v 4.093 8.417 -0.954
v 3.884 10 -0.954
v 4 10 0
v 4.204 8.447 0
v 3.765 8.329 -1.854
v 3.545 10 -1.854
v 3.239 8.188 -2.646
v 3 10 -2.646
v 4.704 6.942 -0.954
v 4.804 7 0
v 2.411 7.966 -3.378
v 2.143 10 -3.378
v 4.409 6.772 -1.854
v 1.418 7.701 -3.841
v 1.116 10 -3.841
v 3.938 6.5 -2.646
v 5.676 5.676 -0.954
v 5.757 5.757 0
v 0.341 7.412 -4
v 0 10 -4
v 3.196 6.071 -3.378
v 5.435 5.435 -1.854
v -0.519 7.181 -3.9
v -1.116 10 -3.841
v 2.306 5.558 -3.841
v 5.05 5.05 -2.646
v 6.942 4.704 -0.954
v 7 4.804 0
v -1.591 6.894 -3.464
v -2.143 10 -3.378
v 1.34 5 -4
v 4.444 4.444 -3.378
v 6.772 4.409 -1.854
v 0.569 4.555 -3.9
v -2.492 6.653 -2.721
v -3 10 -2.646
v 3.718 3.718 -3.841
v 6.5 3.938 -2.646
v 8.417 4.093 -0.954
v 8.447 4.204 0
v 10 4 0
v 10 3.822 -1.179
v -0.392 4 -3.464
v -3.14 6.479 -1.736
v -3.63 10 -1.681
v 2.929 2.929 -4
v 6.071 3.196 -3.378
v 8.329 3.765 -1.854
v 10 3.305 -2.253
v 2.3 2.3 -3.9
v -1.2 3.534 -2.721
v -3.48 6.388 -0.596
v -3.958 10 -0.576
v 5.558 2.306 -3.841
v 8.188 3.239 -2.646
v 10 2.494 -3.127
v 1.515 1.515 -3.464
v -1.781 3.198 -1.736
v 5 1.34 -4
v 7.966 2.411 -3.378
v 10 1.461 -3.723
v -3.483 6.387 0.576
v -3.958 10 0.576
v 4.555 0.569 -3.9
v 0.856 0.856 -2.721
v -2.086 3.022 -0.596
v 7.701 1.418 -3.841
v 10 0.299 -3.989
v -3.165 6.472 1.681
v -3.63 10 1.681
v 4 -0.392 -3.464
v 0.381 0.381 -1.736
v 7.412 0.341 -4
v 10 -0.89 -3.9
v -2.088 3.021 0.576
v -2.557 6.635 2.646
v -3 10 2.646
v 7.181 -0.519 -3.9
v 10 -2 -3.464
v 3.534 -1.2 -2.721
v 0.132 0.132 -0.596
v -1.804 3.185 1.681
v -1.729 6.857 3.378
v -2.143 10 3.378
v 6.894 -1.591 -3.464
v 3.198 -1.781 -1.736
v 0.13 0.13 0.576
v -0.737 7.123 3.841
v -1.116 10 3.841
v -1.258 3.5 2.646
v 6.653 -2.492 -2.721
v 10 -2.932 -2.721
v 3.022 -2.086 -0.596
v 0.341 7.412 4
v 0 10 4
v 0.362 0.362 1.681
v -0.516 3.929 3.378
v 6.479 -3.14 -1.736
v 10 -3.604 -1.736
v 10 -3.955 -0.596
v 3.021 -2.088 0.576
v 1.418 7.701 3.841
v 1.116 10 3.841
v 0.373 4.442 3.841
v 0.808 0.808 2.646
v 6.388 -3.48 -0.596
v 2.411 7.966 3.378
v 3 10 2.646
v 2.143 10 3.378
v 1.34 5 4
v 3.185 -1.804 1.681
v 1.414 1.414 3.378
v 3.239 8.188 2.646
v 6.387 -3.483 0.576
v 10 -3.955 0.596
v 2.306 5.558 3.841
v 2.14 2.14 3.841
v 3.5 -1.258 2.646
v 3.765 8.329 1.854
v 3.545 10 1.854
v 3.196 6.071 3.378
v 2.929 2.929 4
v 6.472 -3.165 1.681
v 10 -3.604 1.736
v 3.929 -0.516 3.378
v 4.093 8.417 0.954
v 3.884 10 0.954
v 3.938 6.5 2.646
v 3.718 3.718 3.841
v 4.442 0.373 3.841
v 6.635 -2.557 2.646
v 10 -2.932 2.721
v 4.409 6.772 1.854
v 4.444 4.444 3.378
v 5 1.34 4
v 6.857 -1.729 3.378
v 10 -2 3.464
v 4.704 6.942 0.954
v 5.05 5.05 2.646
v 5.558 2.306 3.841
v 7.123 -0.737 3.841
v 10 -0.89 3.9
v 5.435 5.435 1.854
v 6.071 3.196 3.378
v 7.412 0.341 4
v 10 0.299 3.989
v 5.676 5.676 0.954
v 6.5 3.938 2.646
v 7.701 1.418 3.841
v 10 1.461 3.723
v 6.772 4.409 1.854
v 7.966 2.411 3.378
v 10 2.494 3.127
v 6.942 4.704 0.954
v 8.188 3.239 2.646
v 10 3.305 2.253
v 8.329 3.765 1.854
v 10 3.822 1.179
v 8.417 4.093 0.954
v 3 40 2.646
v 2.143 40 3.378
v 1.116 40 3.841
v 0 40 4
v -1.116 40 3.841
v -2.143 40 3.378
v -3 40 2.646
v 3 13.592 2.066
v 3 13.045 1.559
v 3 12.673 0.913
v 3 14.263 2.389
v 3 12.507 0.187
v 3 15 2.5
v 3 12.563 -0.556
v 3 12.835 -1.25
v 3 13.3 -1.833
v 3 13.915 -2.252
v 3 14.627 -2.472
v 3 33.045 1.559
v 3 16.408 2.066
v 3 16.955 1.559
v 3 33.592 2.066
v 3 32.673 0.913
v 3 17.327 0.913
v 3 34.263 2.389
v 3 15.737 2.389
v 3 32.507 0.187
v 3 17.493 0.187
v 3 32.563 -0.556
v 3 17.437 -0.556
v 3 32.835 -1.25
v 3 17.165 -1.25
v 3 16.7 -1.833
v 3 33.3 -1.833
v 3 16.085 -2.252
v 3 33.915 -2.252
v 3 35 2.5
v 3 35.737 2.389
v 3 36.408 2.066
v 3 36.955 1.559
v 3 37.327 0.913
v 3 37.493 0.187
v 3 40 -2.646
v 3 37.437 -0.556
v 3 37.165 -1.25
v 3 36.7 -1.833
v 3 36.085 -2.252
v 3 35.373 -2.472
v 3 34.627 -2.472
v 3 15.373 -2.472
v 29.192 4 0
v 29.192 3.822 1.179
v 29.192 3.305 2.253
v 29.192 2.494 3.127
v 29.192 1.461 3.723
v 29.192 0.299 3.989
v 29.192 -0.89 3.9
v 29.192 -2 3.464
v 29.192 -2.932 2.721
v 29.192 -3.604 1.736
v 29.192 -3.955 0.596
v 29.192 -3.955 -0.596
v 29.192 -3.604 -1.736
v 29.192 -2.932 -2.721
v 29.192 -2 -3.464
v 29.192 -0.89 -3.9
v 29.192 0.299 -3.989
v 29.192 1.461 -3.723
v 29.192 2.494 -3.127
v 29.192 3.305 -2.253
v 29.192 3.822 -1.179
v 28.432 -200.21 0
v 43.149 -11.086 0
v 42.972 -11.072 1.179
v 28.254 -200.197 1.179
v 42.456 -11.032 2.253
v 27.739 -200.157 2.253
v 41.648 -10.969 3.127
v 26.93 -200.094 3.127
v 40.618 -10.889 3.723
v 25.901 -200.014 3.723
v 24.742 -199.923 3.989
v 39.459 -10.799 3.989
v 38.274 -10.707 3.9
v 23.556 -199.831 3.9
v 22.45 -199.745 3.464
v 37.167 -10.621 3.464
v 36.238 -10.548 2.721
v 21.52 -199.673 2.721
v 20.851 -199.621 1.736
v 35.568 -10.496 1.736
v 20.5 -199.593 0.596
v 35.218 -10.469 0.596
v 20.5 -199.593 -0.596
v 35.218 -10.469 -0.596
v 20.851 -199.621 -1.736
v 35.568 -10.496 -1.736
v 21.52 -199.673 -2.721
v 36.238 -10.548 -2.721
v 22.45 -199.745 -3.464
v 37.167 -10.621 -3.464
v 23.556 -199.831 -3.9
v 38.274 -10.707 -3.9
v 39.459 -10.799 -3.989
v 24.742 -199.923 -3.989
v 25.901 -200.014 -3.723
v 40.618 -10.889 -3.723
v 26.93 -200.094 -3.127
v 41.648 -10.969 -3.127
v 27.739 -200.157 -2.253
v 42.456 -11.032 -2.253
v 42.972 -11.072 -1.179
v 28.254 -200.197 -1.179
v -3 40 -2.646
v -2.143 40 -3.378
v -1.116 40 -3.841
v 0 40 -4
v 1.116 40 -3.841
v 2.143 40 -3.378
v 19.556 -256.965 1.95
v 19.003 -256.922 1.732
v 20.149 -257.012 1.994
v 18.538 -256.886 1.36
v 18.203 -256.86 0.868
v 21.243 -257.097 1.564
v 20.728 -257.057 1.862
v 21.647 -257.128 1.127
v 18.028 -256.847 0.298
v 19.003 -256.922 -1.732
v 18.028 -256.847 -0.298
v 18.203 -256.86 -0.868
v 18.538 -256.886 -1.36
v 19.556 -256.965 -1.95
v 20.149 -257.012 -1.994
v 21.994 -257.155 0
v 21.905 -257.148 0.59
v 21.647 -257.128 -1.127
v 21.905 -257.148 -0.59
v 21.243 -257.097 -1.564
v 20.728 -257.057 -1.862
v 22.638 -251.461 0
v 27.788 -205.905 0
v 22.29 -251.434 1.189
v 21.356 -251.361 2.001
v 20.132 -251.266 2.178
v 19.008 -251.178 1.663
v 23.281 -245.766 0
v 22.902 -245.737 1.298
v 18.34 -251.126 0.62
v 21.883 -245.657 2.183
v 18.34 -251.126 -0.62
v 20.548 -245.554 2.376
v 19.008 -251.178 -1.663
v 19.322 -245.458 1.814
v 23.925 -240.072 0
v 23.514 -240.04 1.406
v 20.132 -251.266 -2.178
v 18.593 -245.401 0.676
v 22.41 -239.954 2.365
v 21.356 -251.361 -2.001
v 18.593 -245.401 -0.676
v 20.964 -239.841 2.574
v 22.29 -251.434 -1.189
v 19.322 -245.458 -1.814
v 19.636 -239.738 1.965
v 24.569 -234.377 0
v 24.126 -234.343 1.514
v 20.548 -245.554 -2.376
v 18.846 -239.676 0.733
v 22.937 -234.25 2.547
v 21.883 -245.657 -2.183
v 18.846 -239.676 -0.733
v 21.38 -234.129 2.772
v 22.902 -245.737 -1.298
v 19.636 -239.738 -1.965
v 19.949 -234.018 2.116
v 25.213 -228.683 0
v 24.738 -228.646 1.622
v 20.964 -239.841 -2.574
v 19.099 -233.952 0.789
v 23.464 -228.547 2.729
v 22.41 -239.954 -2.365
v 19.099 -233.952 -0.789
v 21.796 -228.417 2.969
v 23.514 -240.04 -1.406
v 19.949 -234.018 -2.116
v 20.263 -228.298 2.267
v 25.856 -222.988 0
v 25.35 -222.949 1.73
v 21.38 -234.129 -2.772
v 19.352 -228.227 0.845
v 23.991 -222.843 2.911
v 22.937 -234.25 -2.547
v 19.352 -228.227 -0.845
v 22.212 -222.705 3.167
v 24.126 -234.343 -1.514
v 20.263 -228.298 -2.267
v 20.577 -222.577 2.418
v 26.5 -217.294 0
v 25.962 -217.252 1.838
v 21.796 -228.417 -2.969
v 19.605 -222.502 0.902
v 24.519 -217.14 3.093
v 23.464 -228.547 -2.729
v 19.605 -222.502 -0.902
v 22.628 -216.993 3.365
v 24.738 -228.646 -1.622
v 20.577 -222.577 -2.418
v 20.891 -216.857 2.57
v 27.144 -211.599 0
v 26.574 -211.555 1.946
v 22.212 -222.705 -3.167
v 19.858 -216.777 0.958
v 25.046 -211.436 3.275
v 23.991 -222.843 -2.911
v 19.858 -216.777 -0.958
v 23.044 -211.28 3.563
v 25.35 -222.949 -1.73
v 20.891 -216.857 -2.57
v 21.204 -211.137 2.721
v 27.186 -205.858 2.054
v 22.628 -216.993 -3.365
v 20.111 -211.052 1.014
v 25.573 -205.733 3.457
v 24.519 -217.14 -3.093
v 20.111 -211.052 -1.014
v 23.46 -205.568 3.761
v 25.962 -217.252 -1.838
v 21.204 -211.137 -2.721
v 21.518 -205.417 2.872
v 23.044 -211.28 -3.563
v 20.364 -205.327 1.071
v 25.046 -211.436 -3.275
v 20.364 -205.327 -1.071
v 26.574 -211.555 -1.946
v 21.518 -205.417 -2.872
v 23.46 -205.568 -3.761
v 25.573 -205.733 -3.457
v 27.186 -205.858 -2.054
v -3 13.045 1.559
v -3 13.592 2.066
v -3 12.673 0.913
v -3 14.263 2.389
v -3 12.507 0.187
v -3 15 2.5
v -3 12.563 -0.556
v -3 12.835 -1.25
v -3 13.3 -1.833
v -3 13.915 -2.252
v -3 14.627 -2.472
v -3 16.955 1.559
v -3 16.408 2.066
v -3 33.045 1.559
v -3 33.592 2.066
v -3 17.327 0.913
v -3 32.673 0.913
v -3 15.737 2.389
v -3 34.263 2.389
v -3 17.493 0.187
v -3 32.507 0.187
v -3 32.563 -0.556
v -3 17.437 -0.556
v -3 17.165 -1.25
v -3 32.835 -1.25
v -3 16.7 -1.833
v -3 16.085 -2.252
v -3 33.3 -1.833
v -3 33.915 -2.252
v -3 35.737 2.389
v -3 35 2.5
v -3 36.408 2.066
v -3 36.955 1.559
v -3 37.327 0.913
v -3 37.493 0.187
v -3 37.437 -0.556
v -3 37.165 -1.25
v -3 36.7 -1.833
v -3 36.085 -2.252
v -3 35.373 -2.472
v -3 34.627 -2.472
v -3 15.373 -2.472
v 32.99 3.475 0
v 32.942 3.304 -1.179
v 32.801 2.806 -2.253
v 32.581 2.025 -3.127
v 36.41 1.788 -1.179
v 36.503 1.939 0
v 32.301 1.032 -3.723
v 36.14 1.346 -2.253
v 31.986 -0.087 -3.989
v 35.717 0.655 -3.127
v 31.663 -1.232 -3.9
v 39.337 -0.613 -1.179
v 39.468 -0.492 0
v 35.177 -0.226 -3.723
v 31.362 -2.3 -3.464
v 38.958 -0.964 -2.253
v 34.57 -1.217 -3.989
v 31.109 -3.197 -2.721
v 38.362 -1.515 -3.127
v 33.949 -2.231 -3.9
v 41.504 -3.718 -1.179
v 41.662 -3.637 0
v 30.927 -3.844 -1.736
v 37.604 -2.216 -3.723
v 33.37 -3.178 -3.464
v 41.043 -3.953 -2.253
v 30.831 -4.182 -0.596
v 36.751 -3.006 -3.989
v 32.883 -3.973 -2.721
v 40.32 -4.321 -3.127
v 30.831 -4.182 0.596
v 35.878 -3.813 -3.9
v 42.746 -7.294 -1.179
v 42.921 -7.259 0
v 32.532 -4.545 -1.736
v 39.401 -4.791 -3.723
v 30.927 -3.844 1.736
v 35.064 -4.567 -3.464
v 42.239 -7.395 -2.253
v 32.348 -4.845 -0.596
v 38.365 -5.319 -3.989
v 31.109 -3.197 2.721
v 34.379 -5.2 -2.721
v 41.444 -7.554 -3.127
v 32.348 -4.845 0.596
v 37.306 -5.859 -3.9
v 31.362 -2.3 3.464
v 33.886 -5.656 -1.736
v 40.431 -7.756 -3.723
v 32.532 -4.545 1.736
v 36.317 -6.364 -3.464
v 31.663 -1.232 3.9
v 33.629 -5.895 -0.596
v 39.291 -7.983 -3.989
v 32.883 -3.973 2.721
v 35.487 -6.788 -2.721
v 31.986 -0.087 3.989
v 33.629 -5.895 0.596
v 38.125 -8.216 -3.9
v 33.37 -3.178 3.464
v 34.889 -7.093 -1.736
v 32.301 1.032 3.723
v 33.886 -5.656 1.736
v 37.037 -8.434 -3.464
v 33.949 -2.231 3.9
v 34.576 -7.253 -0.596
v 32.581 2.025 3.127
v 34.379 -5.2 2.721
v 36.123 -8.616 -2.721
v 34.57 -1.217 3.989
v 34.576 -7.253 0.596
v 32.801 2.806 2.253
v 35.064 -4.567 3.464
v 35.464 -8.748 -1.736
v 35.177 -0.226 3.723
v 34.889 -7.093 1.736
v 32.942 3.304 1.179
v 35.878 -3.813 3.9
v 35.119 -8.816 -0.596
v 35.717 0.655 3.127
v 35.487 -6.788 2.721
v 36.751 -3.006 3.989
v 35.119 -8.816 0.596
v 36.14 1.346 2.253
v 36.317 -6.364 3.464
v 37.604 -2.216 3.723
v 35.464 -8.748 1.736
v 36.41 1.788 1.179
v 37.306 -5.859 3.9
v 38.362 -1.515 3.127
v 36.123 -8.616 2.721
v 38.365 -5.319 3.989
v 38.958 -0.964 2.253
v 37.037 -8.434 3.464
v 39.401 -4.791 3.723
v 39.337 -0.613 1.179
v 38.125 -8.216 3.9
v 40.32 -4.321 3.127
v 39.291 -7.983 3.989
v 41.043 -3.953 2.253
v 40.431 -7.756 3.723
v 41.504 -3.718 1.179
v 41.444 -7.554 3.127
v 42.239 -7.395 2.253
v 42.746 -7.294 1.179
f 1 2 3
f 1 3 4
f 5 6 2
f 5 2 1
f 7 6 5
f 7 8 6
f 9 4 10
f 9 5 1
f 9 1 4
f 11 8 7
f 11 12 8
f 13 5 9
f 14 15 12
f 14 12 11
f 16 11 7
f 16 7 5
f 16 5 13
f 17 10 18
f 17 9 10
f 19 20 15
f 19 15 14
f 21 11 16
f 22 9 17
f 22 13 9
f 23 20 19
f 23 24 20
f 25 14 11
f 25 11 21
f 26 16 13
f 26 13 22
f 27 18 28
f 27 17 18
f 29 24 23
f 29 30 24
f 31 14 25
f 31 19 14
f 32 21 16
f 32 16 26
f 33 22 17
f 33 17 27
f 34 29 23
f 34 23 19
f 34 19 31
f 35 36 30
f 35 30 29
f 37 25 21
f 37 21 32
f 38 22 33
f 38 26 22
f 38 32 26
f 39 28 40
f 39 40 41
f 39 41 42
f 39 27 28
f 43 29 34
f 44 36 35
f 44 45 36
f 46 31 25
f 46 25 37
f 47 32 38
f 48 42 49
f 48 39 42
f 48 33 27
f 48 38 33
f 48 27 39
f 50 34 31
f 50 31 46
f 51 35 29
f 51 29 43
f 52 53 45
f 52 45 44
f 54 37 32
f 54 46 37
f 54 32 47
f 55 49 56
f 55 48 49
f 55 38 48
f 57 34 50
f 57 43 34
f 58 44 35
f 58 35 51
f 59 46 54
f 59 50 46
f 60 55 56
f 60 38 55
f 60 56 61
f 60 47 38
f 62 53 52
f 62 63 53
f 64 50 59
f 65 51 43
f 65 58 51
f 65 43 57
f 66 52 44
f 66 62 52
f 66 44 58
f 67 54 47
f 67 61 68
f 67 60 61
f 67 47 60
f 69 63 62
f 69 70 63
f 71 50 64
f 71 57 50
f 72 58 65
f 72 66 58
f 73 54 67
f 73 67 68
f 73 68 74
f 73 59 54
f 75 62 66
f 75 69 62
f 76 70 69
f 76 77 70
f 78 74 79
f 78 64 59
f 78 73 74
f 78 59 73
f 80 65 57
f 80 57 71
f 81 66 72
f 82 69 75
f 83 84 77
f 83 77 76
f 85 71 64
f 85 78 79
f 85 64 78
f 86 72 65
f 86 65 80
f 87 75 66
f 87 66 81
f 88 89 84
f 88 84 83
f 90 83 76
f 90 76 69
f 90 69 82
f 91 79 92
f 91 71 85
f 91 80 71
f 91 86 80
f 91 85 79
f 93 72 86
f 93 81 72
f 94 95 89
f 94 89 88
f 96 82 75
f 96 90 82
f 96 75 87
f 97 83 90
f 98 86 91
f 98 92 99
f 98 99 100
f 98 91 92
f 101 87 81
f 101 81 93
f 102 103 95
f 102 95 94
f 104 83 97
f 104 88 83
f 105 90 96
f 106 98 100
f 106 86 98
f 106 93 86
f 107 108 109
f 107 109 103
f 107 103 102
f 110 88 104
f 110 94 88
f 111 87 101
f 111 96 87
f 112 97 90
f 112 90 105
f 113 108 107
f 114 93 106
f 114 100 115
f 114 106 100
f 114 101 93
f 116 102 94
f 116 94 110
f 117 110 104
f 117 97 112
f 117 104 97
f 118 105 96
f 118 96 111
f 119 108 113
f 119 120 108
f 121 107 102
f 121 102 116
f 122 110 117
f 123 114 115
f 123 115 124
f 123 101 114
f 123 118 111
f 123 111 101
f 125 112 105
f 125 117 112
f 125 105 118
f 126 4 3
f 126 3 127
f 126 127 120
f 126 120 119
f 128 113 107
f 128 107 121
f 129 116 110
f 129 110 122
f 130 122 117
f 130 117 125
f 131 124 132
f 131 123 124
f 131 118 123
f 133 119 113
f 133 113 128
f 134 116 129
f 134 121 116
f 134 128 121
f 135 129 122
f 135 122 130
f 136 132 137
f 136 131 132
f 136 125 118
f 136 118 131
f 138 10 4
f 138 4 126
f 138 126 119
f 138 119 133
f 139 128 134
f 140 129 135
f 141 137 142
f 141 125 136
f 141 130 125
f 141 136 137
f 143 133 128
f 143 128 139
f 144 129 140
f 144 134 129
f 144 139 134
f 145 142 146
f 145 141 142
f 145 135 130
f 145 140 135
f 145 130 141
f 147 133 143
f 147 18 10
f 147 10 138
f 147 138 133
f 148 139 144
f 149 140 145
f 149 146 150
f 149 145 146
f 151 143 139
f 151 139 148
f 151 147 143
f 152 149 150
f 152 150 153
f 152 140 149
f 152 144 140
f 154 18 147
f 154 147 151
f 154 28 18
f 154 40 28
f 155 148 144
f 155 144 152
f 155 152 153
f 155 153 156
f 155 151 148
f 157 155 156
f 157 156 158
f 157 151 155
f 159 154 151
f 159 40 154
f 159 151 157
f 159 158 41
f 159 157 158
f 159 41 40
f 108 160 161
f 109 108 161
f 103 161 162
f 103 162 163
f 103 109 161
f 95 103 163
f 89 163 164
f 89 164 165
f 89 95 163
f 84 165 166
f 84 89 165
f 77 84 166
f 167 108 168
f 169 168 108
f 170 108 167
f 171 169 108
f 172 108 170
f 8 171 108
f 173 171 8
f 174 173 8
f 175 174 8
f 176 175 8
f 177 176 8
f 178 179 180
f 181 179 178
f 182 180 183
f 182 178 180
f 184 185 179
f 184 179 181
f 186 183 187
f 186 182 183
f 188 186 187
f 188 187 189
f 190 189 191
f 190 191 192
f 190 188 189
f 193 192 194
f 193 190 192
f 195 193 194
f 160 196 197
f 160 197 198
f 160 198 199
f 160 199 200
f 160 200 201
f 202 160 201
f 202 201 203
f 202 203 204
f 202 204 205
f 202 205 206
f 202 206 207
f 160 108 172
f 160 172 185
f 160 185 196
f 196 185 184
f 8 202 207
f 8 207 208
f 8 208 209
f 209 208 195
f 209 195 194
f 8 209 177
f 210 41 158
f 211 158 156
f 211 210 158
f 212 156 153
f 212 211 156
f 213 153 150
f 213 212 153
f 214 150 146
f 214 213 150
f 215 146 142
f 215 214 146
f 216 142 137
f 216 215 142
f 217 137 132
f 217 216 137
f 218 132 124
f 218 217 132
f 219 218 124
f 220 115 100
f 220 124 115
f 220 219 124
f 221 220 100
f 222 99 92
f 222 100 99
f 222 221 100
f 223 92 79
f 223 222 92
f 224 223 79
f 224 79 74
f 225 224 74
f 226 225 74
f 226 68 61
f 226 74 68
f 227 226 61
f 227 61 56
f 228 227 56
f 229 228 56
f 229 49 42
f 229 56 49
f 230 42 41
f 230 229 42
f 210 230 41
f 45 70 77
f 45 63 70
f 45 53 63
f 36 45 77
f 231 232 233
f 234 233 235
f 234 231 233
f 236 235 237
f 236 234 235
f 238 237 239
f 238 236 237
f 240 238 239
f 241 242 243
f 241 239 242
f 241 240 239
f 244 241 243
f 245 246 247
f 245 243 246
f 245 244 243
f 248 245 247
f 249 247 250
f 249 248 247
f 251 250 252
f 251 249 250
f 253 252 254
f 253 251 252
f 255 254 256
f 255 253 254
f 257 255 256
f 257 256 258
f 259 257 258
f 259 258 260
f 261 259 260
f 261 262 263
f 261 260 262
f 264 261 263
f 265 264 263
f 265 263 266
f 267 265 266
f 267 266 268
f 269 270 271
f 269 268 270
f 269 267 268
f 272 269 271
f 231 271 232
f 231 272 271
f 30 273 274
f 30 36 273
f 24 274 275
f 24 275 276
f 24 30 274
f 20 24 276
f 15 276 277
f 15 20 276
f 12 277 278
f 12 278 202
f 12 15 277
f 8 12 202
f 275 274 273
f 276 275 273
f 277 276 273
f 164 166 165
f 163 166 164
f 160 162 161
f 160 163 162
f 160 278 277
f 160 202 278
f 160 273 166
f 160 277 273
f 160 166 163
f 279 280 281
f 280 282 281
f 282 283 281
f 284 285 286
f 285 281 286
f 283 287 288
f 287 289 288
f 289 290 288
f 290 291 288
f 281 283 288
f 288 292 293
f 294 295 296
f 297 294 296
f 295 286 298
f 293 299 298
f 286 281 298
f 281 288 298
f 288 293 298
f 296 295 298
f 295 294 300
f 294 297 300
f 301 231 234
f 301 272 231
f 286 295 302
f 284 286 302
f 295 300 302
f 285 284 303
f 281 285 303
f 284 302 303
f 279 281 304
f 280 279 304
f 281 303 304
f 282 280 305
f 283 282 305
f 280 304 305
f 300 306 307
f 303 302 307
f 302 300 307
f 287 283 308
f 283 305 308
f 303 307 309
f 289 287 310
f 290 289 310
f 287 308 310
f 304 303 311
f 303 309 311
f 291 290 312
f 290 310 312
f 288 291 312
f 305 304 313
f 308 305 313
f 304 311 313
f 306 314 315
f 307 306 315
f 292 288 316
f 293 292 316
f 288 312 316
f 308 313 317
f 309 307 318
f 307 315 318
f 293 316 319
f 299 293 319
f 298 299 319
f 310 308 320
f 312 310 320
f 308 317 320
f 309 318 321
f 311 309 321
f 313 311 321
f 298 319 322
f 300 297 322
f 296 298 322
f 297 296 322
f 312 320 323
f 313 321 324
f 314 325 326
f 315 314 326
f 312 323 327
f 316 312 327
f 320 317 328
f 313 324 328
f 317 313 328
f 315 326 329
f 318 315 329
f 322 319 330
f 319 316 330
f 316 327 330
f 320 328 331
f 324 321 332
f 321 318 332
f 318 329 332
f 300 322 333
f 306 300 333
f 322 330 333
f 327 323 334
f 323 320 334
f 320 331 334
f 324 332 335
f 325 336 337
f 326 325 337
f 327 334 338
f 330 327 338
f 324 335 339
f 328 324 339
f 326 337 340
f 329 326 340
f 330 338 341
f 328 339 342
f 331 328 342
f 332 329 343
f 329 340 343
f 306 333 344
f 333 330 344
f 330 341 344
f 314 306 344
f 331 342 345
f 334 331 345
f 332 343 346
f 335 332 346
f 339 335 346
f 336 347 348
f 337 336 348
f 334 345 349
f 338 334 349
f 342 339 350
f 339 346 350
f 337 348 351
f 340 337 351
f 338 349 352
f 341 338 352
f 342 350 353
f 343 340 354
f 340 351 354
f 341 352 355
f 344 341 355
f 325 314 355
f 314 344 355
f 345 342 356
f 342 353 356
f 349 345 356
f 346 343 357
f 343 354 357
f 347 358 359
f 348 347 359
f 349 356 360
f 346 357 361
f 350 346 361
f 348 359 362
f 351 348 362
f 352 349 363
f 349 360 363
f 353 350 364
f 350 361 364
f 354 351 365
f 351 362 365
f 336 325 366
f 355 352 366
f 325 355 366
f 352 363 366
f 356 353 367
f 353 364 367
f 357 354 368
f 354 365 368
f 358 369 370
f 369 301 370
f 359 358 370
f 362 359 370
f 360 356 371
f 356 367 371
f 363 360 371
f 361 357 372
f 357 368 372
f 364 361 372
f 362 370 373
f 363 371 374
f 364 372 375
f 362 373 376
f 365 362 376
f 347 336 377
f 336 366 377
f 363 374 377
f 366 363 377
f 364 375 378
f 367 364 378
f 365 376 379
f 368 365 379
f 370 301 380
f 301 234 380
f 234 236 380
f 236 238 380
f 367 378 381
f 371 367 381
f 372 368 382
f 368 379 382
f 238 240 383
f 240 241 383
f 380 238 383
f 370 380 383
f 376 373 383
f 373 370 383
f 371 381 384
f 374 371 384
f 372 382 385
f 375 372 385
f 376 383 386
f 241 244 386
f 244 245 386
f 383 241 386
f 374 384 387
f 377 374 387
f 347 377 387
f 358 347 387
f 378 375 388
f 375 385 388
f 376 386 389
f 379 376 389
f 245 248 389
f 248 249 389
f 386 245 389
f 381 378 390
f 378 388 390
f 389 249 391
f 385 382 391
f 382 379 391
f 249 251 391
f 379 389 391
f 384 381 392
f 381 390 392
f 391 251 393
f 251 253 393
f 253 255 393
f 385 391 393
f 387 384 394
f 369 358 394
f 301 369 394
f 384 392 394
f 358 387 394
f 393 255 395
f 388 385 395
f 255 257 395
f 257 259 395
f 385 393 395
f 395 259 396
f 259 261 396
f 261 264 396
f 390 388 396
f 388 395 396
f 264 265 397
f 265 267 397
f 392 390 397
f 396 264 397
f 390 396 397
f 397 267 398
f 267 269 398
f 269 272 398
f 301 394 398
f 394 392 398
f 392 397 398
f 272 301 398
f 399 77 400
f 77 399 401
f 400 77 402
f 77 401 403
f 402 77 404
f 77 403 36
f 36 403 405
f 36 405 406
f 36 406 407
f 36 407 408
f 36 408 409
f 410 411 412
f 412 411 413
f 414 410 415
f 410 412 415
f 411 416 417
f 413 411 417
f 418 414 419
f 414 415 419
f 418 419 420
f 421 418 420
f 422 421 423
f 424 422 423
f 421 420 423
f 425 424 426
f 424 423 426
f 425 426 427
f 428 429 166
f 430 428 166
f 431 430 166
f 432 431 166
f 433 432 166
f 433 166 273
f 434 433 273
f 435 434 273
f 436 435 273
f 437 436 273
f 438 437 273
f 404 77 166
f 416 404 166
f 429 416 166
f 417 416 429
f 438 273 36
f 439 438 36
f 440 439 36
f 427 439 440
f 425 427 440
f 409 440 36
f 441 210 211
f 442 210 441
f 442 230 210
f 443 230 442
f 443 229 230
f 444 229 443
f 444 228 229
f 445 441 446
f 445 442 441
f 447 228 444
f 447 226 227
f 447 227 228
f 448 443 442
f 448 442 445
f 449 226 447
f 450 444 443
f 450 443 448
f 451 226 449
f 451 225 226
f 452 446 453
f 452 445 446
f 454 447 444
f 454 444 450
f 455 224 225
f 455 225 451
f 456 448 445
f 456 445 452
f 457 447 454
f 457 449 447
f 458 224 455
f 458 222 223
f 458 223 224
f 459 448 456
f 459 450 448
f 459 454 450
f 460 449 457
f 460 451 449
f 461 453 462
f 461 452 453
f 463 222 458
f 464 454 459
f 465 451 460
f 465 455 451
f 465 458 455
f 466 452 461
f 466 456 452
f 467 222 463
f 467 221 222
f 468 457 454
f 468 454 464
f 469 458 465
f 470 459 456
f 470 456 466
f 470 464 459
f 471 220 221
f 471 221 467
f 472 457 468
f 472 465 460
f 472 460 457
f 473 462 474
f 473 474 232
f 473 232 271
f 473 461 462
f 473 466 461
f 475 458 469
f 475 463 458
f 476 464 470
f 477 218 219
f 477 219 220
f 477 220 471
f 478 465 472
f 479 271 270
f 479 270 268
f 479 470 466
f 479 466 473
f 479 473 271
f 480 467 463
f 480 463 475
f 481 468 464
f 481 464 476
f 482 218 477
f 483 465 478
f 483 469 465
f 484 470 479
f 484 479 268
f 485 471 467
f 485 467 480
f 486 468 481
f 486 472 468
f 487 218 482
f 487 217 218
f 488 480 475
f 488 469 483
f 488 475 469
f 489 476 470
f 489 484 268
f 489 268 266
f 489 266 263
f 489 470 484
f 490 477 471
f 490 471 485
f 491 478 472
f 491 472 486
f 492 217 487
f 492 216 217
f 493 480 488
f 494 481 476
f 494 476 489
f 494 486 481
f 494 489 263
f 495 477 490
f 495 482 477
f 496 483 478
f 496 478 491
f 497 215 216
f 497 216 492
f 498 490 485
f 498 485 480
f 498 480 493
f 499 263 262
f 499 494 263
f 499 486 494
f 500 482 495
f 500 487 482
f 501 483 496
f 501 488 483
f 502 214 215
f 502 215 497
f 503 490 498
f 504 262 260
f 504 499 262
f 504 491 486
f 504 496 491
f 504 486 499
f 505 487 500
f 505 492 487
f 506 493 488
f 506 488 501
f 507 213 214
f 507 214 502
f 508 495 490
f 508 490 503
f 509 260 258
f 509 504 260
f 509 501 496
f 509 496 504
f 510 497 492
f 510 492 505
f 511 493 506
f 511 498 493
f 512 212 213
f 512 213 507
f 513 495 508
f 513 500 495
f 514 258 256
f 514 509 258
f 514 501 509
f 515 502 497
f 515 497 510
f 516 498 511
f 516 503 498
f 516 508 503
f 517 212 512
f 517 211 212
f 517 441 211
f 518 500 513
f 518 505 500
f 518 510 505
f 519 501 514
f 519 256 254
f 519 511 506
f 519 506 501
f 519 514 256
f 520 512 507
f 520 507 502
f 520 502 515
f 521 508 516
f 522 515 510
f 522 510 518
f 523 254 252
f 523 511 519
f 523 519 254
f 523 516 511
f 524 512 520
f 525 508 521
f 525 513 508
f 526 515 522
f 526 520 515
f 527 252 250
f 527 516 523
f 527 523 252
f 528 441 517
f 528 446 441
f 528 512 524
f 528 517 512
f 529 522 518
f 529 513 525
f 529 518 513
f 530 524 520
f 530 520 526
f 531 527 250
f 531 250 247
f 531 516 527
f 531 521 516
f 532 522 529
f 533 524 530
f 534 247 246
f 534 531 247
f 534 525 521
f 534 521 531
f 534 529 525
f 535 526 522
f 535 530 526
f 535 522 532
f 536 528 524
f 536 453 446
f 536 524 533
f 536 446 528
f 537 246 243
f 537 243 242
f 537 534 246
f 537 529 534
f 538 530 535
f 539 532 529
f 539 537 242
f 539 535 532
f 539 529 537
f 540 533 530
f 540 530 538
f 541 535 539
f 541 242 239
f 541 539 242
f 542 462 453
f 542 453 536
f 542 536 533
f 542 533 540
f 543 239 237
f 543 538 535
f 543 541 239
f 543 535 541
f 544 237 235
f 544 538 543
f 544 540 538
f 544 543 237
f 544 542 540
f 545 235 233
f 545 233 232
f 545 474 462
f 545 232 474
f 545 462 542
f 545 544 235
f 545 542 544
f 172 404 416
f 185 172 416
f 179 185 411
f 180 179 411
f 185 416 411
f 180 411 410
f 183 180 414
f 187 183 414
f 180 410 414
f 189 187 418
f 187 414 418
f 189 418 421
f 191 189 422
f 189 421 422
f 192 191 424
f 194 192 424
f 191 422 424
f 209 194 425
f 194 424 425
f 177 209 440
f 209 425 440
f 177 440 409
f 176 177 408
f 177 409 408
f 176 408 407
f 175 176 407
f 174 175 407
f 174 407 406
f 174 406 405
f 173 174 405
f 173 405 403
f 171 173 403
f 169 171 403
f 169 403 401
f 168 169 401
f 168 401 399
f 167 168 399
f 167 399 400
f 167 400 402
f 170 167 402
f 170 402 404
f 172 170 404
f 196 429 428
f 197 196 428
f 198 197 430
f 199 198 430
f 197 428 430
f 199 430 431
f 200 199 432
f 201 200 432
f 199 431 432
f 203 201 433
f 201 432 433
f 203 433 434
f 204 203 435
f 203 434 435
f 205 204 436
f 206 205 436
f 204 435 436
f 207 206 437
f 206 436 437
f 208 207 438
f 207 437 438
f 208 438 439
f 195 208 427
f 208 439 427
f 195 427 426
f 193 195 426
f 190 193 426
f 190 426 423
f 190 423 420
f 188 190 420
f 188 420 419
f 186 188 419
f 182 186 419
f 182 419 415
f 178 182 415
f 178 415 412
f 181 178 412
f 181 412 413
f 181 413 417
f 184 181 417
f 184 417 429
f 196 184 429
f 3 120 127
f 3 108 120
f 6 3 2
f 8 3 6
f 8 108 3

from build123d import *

# Parameters (mm, degrees)
SKETCH3_R             = 4
CHAMFER1_SIZE         = 2
CHAMFER1_SIZE2        = 57.272506566
SKETCH4_OUTSIDE_W     = 109.39
SKETCH4_OUTSIDE_H     = 70.198
SKETCH4_OUTSIDE_W_2   = 6
SKETCH4_OUTSIDE_H_2   = 35.530215116
EXTRUDE1_DEPTH        = 30
M6_TAPPED_HOLE1_D     = 5
M6_TAPPED_HOLE1_DEPTH = 9
M6_TAPPED_HOLE1_TIP   = 1.502151548


with BuildPart() as part:
    # Sweep1: sweep along a path in Sketch1
    with BuildLine(Plane.XY) as sweep1_path:
        Line((0, 40), (0, 10))
        ThreePointArc((0, 10), (2.928932188, 2.928932188), (10, 0))
        Line((10, 0), (29.191555041, 0))
        ThreePointArc((29.191555041, 0), (36.531808546, -3.208779308), (39.161411338, -10.775864303))
        Line((39.161411338, -10.775864303), (20, -257))
    # Sketch3 → Sweep1 (sweep)
    with BuildSketch(Plane(origin=(0, 40, 0), x_dir=(1, 0, 0), z_dir=(0, 1, 0))):
        Circle(SKETCH3_R)
    sweep(path=sweep1_path.line)

    # Chamfer1
    chamfer1_edges = [part.edges().sort_by_distance(p)[0] for p in [
        (16.012057481, -256.689654279, 0),
    ]]
    chamfer1_side = [part.faces().sort_by_distance(p)[0] for p in [
        (20, -257, 0),
    ]]
    chamfer(chamfer1_edges, length=CHAMFER1_SIZE, length2=CHAMFER1_SIZE2, reference=chamfer1_side[0])

    # Sketch4 outside → Extrude1 (cut)
    with BuildSketch(Plane(origin=(0, 40, 0), x_dir=(1, 0, 0), z_dir=(0, 1, 0))):
        with Locations((19.596, 0)):
            Rectangle(SKETCH4_OUTSIDE_W, SKETCH4_OUTSIDE_H)
        Rectangle(SKETCH4_OUTSIDE_W_2, SKETCH4_OUTSIDE_H_2, mode=Mode.SUBTRACT)
    extrude(amount=-EXTRUDE1_DEPTH, mode=Mode.SUBTRACT)

    # M6 Tapped Hole1
    with Locations(Plane(origin=(3, 0, 0), x_dir=(0, 0, -1), z_dir=(1, 0, 0))):
        with Locations((0, 35), (0, 15)):
            Hole(M6_TAPPED_HOLE1_D / 2, depth=M6_TAPPED_HOLE1_DEPTH)
            with Locations((0, 0, -(M6_TAPPED_HOLE1_DEPTH + M6_TAPPED_HOLE1_TIP / 2))):  # 118° drill point
                Cone(0, M6_TAPPED_HOLE1_D / 2, M6_TAPPED_HOLE1_TIP, mode=Mode.SUBTRACT)


solid = part.part
